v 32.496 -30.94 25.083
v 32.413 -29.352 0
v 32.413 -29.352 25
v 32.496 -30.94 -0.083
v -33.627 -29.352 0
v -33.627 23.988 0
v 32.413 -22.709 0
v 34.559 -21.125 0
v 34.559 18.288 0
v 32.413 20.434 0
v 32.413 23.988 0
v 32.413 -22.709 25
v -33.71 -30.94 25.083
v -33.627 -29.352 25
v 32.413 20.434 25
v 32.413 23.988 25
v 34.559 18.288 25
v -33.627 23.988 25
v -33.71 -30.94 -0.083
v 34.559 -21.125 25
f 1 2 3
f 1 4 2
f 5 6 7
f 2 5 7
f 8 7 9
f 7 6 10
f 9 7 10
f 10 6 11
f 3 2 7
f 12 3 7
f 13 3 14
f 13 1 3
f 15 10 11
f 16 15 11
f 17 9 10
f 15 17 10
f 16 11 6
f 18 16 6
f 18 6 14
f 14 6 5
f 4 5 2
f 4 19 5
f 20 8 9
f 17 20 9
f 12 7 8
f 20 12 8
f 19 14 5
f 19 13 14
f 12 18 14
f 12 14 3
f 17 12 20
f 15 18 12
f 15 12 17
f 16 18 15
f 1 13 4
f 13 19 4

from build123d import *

# Parameters (mm, degrees)
F1_DEPTH  = 25
F1_FACE_W = 66.04
F1_FACE_H = 25
F2_DEPTH  = 1.588
F2_TAPER  = -3


with BuildPart() as f1:
    # F0 (on Top) → F1 (new body)
    with BuildSketch(Plane.XY):
        Polygon((32.4131661011, 23.9884992057), (-33.6268338989, 23.9884992057), (-33.6268338989, -29.3515007943), (32.4131661011, -29.3515007943), (32.4131661011, -22.7092797923), (34.5588182305, -21.1252766549), (34.5588182305, 18.2884992057), (32.4131661011, 20.4341513352), align=None)
    extrude(amount=F1_DEPTH)

    # F1_face (on face) → F2 (join)
    with BuildSketch(Plane(origin=(-0.6068338989, -29.3515007943, 12.5), x_dir=(1, 0, 0), z_dir=(0, -1, 0))):
        Rectangle(F1_FACE_W, F1_FACE_H)
    extrude(amount=F2_DEPTH, taper=F2_TAPER)


solid = f1.part
